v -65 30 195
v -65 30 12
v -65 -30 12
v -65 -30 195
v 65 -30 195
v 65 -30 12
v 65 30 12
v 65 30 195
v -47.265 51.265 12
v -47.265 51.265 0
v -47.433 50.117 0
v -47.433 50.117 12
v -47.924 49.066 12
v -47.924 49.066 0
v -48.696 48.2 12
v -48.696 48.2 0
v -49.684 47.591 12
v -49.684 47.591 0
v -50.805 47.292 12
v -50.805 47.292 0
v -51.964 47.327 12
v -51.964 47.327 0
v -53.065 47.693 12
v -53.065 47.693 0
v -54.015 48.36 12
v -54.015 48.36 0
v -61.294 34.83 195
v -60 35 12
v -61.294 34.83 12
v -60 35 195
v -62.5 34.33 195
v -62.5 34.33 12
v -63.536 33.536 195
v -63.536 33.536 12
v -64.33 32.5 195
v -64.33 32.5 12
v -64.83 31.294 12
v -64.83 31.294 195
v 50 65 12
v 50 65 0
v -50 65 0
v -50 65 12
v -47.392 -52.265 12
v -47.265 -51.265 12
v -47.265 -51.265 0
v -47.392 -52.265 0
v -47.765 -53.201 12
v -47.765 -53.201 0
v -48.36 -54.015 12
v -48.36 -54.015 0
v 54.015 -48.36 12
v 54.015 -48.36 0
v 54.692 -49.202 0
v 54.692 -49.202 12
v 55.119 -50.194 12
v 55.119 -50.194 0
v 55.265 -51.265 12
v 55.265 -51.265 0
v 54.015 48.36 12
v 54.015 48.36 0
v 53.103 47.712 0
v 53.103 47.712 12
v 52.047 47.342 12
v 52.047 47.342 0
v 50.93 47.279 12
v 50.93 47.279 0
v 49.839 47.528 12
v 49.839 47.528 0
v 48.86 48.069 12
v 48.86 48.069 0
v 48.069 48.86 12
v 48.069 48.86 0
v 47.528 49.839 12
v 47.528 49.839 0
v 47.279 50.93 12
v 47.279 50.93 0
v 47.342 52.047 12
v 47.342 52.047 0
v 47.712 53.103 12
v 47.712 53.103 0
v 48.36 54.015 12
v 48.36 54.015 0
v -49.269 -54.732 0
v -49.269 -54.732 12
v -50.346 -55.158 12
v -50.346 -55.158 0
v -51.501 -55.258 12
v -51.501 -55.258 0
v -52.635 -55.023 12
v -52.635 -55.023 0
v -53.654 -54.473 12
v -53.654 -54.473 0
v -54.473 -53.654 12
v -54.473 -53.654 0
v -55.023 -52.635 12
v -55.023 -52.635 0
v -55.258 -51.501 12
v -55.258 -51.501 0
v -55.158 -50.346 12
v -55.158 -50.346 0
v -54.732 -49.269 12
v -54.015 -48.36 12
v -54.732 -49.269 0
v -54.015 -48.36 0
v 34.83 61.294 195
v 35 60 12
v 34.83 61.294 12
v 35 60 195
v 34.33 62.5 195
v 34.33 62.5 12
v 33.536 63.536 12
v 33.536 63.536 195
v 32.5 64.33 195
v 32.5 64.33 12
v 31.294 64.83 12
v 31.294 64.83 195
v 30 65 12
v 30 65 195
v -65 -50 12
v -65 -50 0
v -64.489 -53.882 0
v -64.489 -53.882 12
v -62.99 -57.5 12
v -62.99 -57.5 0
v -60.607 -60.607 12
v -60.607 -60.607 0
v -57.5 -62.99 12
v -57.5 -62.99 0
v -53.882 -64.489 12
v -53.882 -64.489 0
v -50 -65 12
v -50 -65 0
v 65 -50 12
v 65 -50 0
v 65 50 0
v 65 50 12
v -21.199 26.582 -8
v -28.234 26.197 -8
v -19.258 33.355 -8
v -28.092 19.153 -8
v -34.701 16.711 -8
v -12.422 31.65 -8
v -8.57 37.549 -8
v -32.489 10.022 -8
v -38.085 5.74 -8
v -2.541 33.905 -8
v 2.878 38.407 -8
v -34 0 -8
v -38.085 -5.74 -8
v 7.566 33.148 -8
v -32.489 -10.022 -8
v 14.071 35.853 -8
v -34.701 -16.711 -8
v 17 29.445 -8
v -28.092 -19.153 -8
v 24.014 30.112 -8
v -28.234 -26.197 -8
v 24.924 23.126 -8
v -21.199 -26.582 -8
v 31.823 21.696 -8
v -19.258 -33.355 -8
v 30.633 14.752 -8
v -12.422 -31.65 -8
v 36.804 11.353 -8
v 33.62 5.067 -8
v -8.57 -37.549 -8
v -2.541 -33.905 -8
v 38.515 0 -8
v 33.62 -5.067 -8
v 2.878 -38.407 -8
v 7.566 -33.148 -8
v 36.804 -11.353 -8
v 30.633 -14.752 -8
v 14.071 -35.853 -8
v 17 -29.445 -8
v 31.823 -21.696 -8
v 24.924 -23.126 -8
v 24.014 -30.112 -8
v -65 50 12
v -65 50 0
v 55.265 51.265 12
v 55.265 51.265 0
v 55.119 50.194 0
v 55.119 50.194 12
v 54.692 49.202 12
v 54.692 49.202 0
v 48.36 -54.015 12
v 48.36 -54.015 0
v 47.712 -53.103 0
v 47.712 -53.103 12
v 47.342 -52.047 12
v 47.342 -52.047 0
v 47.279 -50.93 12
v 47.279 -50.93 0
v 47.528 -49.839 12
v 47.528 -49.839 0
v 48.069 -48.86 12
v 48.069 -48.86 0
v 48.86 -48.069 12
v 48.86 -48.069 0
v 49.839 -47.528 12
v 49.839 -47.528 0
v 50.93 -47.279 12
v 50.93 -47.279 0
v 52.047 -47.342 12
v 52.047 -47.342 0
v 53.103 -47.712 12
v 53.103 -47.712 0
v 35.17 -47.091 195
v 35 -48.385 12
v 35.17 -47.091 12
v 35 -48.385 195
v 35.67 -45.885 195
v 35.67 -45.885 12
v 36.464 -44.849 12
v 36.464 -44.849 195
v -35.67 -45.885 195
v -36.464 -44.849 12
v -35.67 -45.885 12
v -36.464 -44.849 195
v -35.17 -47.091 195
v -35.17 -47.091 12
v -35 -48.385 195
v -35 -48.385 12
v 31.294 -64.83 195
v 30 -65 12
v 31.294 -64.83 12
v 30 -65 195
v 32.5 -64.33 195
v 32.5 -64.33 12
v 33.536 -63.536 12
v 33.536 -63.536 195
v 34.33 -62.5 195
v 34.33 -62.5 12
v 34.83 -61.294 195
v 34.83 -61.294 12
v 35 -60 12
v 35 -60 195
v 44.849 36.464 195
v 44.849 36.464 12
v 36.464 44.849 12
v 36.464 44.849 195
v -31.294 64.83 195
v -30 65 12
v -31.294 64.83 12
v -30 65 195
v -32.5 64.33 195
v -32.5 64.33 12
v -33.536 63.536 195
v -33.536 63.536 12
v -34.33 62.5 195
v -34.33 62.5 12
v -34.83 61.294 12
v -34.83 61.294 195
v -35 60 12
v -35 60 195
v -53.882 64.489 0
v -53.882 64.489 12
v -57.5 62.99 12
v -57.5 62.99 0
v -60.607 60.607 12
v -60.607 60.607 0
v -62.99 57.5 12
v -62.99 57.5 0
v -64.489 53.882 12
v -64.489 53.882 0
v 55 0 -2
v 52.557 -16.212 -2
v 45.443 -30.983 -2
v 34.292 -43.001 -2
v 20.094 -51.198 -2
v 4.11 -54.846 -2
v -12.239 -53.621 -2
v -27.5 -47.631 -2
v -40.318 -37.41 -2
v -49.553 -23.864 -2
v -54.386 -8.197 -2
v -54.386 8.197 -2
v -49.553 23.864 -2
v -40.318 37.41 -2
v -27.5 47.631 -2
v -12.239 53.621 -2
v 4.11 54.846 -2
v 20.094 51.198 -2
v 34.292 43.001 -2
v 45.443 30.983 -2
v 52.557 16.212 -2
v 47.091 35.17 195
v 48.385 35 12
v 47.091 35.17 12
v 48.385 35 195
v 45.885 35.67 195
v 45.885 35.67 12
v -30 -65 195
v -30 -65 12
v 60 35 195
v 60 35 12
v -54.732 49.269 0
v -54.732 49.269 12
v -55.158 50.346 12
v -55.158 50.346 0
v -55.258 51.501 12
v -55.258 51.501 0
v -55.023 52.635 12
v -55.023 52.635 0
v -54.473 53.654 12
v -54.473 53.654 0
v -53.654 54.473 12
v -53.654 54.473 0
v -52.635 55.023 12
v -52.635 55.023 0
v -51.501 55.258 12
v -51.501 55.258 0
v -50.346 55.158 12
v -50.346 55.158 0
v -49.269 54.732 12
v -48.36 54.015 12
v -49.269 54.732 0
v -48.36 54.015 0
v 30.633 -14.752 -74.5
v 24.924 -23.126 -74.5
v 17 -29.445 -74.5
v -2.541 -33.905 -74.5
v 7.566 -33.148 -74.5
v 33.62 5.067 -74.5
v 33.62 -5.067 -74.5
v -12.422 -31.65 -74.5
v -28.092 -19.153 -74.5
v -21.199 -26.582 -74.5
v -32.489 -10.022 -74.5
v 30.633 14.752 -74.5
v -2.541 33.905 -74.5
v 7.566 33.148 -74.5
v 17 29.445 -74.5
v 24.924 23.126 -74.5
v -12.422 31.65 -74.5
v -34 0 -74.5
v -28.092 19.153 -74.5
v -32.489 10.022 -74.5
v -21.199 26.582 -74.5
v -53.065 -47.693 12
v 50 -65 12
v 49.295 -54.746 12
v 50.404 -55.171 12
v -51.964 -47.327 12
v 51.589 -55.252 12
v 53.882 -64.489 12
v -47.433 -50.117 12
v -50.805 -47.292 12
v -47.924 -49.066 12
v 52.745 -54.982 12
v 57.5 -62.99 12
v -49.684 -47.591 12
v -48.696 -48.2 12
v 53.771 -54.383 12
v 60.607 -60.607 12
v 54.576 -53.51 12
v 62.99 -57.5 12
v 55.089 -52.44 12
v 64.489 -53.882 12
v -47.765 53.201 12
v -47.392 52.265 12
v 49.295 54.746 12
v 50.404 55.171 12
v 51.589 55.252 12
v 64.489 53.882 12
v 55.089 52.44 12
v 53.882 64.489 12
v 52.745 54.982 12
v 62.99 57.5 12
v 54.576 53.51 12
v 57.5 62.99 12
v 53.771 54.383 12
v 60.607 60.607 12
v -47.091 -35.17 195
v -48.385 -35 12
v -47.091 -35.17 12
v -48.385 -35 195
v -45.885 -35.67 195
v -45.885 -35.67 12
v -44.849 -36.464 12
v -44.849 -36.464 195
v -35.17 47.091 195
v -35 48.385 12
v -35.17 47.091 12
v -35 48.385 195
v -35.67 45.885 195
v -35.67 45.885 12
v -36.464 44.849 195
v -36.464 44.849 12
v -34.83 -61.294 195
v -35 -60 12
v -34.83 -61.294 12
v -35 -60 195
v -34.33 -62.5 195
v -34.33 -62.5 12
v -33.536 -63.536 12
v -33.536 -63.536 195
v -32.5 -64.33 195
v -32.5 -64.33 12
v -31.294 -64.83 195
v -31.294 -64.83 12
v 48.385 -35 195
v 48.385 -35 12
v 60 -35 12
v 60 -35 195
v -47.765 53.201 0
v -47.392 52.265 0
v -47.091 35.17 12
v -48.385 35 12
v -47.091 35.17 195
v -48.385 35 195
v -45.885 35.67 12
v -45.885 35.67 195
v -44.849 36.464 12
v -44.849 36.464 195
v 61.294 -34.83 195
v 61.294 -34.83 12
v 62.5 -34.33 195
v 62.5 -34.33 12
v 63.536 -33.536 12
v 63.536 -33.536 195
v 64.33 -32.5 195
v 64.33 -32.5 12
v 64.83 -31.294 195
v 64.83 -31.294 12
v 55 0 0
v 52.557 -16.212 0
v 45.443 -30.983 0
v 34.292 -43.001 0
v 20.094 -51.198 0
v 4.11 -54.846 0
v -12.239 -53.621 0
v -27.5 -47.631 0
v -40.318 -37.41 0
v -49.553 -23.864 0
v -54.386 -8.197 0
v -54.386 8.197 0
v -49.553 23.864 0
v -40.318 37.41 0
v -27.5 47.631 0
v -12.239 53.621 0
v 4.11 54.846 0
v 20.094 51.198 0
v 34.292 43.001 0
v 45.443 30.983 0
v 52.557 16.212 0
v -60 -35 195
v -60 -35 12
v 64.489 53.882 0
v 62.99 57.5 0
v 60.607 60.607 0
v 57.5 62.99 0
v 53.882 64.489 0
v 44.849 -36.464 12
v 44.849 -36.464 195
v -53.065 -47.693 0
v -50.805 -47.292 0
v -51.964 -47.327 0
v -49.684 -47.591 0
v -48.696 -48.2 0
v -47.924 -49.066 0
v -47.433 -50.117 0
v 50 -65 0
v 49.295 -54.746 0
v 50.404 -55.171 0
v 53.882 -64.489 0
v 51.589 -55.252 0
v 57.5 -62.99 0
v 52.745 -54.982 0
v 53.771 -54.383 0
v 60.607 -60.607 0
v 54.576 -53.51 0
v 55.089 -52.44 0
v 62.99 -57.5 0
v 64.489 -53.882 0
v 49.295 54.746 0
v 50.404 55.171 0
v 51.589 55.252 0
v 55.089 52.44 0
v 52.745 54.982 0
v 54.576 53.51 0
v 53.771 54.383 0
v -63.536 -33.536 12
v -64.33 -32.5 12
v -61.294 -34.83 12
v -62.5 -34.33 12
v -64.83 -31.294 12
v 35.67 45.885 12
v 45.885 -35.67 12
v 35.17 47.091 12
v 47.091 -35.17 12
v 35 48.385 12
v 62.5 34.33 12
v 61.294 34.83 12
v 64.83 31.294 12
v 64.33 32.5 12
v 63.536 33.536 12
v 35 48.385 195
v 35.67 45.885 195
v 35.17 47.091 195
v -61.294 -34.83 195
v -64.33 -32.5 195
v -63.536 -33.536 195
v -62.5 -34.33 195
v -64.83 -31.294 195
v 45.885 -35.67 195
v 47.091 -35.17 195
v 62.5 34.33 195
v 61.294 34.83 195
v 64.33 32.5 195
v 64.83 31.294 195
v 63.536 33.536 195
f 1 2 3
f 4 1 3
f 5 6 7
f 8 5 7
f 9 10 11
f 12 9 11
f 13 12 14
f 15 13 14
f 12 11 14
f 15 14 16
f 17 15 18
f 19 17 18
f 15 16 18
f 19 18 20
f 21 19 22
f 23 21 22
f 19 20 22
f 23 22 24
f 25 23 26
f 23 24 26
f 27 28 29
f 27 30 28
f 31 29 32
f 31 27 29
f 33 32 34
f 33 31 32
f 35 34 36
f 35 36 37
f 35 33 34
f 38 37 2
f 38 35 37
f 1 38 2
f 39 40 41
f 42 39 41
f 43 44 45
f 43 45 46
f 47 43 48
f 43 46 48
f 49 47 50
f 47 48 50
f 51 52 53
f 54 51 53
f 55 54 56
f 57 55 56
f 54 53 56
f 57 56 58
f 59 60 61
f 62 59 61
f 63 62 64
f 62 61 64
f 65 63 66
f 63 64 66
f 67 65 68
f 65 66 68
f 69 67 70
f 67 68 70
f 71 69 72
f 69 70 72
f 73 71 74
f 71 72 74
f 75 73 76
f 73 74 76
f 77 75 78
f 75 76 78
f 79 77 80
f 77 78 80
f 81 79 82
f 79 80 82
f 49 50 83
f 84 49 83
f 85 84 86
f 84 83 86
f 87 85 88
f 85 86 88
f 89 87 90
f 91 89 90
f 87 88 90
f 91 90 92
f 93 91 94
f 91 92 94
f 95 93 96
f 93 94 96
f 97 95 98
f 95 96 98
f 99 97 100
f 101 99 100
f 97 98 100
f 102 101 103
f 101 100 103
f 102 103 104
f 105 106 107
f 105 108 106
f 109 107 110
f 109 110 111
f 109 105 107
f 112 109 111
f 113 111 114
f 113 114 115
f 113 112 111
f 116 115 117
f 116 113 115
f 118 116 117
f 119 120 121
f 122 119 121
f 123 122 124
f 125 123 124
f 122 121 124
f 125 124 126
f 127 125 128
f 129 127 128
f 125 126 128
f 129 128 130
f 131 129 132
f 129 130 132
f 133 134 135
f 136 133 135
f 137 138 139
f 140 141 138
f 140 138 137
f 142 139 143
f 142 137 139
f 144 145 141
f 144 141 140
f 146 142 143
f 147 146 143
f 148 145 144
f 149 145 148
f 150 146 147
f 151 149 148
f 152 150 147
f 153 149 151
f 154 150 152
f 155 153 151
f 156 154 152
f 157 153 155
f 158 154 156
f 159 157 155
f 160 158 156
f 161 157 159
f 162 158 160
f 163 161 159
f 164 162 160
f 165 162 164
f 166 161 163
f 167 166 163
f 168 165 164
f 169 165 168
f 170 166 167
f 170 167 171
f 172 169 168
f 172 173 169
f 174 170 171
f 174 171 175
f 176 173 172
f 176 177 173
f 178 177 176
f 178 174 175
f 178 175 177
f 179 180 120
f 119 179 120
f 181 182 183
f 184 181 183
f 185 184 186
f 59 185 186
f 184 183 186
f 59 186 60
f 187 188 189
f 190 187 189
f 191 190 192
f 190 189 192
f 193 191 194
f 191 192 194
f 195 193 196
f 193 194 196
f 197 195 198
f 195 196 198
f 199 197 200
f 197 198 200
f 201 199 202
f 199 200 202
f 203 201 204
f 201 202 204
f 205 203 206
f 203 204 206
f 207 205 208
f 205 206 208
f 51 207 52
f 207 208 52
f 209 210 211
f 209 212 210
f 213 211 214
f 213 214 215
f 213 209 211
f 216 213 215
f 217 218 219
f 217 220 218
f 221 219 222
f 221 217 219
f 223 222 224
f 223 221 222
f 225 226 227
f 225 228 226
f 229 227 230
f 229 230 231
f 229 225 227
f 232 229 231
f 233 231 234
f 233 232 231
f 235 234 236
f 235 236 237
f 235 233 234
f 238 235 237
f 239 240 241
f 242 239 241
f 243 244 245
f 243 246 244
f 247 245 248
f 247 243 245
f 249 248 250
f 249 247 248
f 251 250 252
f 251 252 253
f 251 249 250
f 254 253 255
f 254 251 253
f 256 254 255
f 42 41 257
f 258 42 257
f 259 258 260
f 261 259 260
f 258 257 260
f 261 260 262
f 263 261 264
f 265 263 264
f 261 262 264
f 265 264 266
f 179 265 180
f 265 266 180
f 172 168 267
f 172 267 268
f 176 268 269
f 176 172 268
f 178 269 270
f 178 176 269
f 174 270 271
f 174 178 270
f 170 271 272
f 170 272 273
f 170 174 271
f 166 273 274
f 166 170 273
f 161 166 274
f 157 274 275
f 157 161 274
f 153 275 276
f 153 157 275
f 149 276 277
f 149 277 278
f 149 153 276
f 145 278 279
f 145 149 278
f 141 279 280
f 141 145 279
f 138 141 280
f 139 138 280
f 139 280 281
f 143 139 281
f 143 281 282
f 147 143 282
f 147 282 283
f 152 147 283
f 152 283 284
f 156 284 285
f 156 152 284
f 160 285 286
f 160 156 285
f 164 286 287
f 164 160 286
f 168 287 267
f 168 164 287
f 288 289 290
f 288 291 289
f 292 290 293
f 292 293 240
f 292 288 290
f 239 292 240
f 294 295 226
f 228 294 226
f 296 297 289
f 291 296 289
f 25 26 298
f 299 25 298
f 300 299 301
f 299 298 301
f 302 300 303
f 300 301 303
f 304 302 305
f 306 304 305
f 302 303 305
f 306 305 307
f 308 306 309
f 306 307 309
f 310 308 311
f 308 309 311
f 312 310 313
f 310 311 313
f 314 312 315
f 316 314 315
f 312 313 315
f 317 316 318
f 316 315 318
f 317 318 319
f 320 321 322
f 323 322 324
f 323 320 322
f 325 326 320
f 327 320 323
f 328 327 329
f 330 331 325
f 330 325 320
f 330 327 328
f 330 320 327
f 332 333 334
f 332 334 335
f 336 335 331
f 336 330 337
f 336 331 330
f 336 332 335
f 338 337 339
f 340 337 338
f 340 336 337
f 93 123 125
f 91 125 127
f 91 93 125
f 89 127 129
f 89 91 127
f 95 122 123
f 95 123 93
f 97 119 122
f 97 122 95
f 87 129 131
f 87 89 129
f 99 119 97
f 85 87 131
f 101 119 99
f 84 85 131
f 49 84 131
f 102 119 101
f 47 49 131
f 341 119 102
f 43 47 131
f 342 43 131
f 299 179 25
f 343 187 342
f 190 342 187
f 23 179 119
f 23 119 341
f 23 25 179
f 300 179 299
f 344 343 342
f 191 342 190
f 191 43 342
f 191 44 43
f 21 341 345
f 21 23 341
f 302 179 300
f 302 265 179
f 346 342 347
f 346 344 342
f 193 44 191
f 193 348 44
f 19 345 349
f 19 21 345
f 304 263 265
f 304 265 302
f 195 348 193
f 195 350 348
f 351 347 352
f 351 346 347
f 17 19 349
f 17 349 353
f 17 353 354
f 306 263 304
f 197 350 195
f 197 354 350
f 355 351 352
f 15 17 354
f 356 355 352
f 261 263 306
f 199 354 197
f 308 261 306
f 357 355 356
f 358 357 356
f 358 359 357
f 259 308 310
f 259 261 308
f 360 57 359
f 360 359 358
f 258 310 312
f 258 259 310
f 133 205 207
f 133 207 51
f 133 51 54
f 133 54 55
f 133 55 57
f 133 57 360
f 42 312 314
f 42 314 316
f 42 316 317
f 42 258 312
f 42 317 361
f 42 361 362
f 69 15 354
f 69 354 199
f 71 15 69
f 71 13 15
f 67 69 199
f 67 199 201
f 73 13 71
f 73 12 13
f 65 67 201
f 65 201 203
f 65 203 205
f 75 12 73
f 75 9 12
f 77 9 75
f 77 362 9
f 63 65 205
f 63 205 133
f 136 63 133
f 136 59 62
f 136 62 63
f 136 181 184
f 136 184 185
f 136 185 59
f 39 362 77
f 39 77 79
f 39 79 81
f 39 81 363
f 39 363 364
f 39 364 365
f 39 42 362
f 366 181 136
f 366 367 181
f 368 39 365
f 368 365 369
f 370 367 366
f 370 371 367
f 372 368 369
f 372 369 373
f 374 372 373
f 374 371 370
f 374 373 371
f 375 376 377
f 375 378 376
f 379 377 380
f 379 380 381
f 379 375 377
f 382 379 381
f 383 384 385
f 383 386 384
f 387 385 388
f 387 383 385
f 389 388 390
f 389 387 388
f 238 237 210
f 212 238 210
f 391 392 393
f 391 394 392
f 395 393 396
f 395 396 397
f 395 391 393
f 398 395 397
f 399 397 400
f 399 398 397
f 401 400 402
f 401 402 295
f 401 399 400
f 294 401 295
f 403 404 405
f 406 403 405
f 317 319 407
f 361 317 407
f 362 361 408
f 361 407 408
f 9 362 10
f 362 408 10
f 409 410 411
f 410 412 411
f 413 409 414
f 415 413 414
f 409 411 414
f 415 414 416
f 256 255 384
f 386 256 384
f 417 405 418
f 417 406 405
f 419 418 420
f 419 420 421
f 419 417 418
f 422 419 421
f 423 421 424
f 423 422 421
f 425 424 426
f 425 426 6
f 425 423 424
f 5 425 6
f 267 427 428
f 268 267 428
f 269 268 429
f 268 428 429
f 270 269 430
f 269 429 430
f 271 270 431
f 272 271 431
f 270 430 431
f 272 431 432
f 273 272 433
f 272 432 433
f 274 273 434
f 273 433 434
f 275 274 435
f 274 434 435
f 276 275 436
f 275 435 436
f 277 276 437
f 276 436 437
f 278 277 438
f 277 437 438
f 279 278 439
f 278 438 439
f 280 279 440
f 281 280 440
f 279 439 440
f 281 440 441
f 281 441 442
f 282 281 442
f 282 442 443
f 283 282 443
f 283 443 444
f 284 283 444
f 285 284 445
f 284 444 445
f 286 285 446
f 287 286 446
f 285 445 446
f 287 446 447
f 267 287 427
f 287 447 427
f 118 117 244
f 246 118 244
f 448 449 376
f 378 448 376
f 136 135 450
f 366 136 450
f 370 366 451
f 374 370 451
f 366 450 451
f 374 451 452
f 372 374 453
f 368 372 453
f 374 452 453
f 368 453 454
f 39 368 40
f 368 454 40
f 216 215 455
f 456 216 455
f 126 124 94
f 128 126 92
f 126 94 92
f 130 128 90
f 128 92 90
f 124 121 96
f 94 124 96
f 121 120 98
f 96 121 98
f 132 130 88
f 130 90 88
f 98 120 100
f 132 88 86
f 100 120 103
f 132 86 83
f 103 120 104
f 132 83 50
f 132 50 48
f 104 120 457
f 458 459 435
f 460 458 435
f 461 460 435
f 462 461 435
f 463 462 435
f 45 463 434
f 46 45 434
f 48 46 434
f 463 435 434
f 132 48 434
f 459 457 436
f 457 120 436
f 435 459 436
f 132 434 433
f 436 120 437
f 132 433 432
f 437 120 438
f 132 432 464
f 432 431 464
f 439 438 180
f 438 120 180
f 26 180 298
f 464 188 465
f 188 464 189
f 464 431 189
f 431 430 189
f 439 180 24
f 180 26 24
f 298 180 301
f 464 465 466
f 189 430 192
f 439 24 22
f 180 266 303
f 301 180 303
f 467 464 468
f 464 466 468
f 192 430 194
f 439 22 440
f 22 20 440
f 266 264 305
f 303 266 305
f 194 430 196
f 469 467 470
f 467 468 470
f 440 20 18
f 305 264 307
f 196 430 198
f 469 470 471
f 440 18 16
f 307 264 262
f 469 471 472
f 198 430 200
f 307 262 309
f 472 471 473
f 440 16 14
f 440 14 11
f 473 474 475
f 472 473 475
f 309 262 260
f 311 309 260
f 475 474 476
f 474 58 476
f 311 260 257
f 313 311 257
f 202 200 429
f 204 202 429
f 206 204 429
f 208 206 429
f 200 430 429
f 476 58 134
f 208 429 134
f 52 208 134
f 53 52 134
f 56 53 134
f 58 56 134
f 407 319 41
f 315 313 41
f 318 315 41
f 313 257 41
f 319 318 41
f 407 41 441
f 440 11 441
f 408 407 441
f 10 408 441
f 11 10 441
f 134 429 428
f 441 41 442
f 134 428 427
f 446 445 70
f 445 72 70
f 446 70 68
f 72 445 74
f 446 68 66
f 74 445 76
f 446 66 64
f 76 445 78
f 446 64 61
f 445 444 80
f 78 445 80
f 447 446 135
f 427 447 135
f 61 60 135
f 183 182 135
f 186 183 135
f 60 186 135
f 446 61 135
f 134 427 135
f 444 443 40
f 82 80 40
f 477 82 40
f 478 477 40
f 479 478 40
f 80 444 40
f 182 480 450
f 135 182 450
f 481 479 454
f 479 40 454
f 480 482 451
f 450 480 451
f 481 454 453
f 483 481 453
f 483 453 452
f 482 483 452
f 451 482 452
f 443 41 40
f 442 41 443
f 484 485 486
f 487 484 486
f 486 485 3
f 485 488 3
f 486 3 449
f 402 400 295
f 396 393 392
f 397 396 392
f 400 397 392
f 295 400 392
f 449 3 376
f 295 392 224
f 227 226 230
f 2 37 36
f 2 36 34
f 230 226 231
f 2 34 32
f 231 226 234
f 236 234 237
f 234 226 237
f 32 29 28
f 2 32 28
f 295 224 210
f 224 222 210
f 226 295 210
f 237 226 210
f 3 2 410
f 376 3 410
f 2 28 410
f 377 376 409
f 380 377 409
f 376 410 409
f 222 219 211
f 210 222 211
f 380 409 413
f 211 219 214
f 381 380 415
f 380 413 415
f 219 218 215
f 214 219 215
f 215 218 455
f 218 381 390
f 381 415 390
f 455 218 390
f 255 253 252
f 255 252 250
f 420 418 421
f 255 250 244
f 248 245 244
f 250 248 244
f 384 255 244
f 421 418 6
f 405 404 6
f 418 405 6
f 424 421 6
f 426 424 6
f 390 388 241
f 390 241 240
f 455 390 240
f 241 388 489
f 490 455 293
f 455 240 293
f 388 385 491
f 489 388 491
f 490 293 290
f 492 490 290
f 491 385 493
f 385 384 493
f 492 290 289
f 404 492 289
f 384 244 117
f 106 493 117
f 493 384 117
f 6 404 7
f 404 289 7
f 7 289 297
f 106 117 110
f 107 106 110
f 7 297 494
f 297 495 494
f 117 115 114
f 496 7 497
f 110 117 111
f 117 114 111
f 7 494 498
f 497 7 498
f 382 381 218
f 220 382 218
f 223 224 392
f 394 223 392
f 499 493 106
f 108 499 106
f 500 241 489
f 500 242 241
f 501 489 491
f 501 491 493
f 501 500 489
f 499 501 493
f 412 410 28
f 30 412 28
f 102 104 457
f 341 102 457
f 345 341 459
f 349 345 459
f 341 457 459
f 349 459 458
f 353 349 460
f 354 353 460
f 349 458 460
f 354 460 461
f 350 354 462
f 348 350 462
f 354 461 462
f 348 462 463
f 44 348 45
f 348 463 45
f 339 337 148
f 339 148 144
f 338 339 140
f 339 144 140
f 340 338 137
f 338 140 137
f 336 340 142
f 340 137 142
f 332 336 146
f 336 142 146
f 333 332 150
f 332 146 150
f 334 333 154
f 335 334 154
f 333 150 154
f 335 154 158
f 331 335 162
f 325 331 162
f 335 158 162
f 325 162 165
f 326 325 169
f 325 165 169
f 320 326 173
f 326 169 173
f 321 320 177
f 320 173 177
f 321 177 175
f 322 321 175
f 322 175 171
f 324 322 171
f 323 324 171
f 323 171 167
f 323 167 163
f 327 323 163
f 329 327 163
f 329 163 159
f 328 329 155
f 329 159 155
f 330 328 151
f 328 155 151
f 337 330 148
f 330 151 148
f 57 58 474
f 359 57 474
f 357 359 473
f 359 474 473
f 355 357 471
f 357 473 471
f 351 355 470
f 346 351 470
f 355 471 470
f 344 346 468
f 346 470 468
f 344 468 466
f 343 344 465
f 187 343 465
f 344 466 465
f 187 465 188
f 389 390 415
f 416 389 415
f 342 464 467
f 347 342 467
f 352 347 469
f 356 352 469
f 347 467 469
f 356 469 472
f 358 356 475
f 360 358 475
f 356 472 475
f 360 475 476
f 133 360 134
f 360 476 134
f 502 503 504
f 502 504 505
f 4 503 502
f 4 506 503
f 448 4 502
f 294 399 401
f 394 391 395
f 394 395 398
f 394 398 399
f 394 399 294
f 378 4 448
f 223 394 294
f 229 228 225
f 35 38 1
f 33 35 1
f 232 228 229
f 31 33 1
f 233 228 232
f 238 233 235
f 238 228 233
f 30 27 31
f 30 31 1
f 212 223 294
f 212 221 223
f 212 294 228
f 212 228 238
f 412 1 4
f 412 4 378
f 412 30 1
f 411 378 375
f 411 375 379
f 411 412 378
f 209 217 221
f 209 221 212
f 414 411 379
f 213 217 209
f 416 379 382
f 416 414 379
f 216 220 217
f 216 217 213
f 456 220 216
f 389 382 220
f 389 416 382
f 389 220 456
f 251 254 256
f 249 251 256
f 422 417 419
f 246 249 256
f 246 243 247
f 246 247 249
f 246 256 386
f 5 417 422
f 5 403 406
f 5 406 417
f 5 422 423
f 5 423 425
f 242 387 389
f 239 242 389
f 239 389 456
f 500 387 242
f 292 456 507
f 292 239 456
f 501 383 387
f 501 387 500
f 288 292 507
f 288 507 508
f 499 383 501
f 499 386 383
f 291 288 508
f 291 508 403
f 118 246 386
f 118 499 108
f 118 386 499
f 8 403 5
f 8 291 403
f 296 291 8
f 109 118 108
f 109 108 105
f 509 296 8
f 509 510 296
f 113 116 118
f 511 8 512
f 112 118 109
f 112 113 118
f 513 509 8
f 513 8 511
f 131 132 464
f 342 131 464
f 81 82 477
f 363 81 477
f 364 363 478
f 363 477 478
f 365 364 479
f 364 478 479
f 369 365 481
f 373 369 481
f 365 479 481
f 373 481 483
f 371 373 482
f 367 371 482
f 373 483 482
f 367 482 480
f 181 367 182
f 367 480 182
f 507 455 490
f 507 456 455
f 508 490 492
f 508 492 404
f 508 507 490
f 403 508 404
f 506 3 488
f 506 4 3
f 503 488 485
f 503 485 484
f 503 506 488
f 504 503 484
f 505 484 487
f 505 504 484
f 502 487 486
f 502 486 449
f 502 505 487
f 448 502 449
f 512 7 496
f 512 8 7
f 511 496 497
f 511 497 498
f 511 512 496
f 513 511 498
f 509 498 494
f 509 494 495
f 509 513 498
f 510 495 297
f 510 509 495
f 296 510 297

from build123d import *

# Parameters (mm, degrees)
BOSS_EXTRUDE1_DEPTH = 12
BOSS_EXTRUDE2_DEPTH = 183
FILLET1_R           = 5
SKETCH4_R           = 55
BOSS_EXTRUDE4_DEPTH = 8
CHAMFER1_SIZE       = 6
CHAMFER1_SIZE2      = 16.484864517
SKETCH3_R           = 34
BOSS_EXTRUDE3_DEPTH = 66.5


with BuildPart() as part:
    # Sketch1 → Boss-Extrude1 (new body)
    with BuildSketch(Plane.XY):
        with BuildLine():
            Line((32.113081447, 65), (-32.113081447, 65))
            ThreePointArc((-32.113081447, 65), (-40.60965067, 60.059189742), (-48.359865355, 54.014566765))
            ThreePointArc((-48.359865355, 54.014566765), (-47.548959547, 52.744852206), (-47.265241636, 51.265241636))
            ThreePointArc((-47.265241636, 51.265241636), (-49.683676038, 47.591190703), (-54.014566765, 48.359865355))
            ThreePointArc((-54.014566765, 48.359865355), (-60.059189742, 40.60965067), (-65, 32.113081447))
            Line((-65, 32.113081447), (-65, -32.113081447))
            ThreePointArc((-65, -32.113081447), (-60.059189742, -40.60965067), (-54.014566765, -48.359865355))
            ThreePointArc((-54.014566765, -48.359865355), (-49.683676038, -47.591190703), (-47.265241636, -51.265241636))
            ThreePointArc((-47.265241636, -51.265241636), (-47.548959547, -52.744852206), (-48.359865355, -54.014566765))
            ThreePointArc((-48.359865355, -54.014566765), (-40.60965067, -60.059189742), (-32.113081447, -65))
            Line((-32.113081447, -65), (32.113081447, -65))
            ThreePointArc((32.113081447, -65), (40.60965067, -60.059189742), (48.359865355, -54.014566765))
            ThreePointArc((48.359865355, -54.014566765), (48.436814511, -48.436814511), (54.014566765, -48.359865355))
            ThreePointArc((54.014566765, -48.359865355), (60.059189742, -40.60965067), (65, -32.113081447))
            Line((65, -32.113081447), (65, 32.113081447))
            ThreePointArc((65, 32.113081447), (60.059189742, 40.60965067), (54.014566765, 48.359865355))
            ThreePointArc((54.014566765, 48.359865355), (48.436814511, 48.436814511), (48.359865355, 54.014566765))
            ThreePointArc((48.359865355, 54.014566765), (40.60965067, 60.059189742), (32.113081447, 65))
        make_face()
        with BuildLine():
            Line((-32.113081447, 65), (-50, 65))
            ThreePointArc((-50, 65), (-60.606601718, 60.606601718), (-65, 50))
            Line((-65, 50), (-65, 32.113081447))
            ThreePointArc((-65, 32.113081447), (-60.059189742, 40.60965067), (-54.014566765, 48.359865355))
            ThreePointArc((-54.014566765, 48.359865355), (-54.093668761, 54.093668761), (-48.359865355, 54.014566765))
            ThreePointArc((-48.359865355, 54.014566765), (-40.60965067, 60.059189742), (-32.113081447, 65))
        make_face()
        with BuildLine():
            ThreePointArc((-54.014566765, -48.359865355), (-60.059189742, -40.60965067), (-65, -32.113081447))
            Line((-65, -32.113081447), (-65, -50))
            ThreePointArc((-65, -50), (-60.606601718, -60.606601718), (-50, -65))
            Line((-50, -65), (-32.113081447, -65))
            ThreePointArc((-32.113081447, -65), (-40.60965067, -60.059189742), (-48.359865355, -54.014566765))
            ThreePointArc((-48.359865355, -54.014566765), (-54.093668761, -54.093668761), (-54.014566765, -48.359865355))
        make_face()
        with BuildLine():
            Line((65, -50), (65, -32.113081447))
            ThreePointArc((65, -32.113081447), (60.059189742, -40.60965067), (54.014566765, -48.359865355))
            ThreePointArc((54.014566765, -48.359865355), (54.939292569, -49.683676038), (55.265241636, -51.265241636))
            ThreePointArc((55.265241636, -51.265241636), (52.744852206, -54.981523725), (48.359865355, -54.014566765))
            ThreePointArc((48.359865355, -54.014566765), (40.60965067, -60.059189742), (32.113081447, -65))
            Line((32.113081447, -65), (50, -65))
            ThreePointArc((50, -65), (60.606601718, -60.606601718), (65, -50))
        make_face()
        with BuildLine():
            Line((50, 65), (32.113081447, 65))
            ThreePointArc((32.113081447, 65), (40.60965067, 60.059189742), (48.359865355, 54.014566765))
            ThreePointArc((48.359865355, 54.014566765), (52.744852206, 54.981523725), (55.265241636, 51.265241636))
            ThreePointArc((55.265241636, 51.265241636), (54.939292569, 49.683676038), (54.014566765, 48.359865355))
            ThreePointArc((54.014566765, 48.359865355), (60.059189742, 40.60965067), (65, 32.113081447))
            Line((65, 32.113081447), (65, 50))
            ThreePointArc((65, 50), (60.606601718, 60.606601718), (50, 65))
        make_face()
    extrude(amount=BOSS_EXTRUDE1_DEPTH)

    # Sketch4 → Boss-Extrude4 (add)
    with BuildSketch(Plane(origin=(0, 0, 0), x_dir=(-1, 0, 0), z_dir=(0, 0, -1))):
        with Locations(Location((0, 0, 0), (0, 0, 180))):
            Circle(SKETCH4_R)
    extrude(amount=BOSS_EXTRUDE4_DEPTH)

    # Chamfer1
    chamfer1_edges = [part.edges().sort_by_distance(p)[0] for p in [
        (-55, 0, -8),
    ]]
    chamfer1_side = [part.faces().sort_by_distance(p)[0] for p in [
        (-55, 0, -4),
    ]]
    chamfer(chamfer1_edges, length=CHAMFER1_SIZE, length2=CHAMFER1_SIZE2, reference=chamfer1_side[0])

    # Sketch3 → Boss-Extrude3 (add)
    with BuildSketch(Plane(origin=(0, 0, -8), x_dir=(-1, 0, 0), z_dir=(0, 0, -1))):
        Circle(SKETCH3_R)
    extrude(amount=BOSS_EXTRUDE3_DEPTH)


with BuildPart() as body_2:
    # Sketch2 → Boss-Extrude2 (new body)
    with BuildSketch(Plane.XY.offset(12)):
        Polygon((-46.313708499, 35), (-65, 35), (-65, -35), (-46.313708499, -35), (-35, -46.313708499), (-35, -65), (35, -65), (35, -46.313708499), (46.313708499, -35), (65, -35), (65, 35), (46.313708499, 35), (35, 46.313708499), (35, 65), (-35, 65), (-35, 46.313708499), align=None)
    extrude(amount=BOSS_EXTRUDE2_DEPTH)

    # Fillet1
    fillet1_edges = [body_2.edges().sort_by_distance(p)[0] for p in [
        (-65, 35, 103.5),
        (-46.313708499, 35, 103.5),
        (-35, 46.313708499, 103.5),
        (-35, 65, 103.5),
        (35, 65, 103.5),
        (35, 46.313708499, 103.5),
        (46.313708499, 35, 103.5),
        (65, 35, 103.5),
        (65, -35, 103.5),
        (46.313708499, -35, 103.5),
        (35, -46.313708499, 103.5),
        (35, -65, 103.5),
        (-35, -65, 103.5),
        (-35, -46.313708499, 103.5),
        (-46.313708499, -35, 103.5),
        (-65, -35, 103.5),
    ]]
    fillet(fillet1_edges, radius=FILLET1_R)


solid = Compound([part.part, body_2.part])
